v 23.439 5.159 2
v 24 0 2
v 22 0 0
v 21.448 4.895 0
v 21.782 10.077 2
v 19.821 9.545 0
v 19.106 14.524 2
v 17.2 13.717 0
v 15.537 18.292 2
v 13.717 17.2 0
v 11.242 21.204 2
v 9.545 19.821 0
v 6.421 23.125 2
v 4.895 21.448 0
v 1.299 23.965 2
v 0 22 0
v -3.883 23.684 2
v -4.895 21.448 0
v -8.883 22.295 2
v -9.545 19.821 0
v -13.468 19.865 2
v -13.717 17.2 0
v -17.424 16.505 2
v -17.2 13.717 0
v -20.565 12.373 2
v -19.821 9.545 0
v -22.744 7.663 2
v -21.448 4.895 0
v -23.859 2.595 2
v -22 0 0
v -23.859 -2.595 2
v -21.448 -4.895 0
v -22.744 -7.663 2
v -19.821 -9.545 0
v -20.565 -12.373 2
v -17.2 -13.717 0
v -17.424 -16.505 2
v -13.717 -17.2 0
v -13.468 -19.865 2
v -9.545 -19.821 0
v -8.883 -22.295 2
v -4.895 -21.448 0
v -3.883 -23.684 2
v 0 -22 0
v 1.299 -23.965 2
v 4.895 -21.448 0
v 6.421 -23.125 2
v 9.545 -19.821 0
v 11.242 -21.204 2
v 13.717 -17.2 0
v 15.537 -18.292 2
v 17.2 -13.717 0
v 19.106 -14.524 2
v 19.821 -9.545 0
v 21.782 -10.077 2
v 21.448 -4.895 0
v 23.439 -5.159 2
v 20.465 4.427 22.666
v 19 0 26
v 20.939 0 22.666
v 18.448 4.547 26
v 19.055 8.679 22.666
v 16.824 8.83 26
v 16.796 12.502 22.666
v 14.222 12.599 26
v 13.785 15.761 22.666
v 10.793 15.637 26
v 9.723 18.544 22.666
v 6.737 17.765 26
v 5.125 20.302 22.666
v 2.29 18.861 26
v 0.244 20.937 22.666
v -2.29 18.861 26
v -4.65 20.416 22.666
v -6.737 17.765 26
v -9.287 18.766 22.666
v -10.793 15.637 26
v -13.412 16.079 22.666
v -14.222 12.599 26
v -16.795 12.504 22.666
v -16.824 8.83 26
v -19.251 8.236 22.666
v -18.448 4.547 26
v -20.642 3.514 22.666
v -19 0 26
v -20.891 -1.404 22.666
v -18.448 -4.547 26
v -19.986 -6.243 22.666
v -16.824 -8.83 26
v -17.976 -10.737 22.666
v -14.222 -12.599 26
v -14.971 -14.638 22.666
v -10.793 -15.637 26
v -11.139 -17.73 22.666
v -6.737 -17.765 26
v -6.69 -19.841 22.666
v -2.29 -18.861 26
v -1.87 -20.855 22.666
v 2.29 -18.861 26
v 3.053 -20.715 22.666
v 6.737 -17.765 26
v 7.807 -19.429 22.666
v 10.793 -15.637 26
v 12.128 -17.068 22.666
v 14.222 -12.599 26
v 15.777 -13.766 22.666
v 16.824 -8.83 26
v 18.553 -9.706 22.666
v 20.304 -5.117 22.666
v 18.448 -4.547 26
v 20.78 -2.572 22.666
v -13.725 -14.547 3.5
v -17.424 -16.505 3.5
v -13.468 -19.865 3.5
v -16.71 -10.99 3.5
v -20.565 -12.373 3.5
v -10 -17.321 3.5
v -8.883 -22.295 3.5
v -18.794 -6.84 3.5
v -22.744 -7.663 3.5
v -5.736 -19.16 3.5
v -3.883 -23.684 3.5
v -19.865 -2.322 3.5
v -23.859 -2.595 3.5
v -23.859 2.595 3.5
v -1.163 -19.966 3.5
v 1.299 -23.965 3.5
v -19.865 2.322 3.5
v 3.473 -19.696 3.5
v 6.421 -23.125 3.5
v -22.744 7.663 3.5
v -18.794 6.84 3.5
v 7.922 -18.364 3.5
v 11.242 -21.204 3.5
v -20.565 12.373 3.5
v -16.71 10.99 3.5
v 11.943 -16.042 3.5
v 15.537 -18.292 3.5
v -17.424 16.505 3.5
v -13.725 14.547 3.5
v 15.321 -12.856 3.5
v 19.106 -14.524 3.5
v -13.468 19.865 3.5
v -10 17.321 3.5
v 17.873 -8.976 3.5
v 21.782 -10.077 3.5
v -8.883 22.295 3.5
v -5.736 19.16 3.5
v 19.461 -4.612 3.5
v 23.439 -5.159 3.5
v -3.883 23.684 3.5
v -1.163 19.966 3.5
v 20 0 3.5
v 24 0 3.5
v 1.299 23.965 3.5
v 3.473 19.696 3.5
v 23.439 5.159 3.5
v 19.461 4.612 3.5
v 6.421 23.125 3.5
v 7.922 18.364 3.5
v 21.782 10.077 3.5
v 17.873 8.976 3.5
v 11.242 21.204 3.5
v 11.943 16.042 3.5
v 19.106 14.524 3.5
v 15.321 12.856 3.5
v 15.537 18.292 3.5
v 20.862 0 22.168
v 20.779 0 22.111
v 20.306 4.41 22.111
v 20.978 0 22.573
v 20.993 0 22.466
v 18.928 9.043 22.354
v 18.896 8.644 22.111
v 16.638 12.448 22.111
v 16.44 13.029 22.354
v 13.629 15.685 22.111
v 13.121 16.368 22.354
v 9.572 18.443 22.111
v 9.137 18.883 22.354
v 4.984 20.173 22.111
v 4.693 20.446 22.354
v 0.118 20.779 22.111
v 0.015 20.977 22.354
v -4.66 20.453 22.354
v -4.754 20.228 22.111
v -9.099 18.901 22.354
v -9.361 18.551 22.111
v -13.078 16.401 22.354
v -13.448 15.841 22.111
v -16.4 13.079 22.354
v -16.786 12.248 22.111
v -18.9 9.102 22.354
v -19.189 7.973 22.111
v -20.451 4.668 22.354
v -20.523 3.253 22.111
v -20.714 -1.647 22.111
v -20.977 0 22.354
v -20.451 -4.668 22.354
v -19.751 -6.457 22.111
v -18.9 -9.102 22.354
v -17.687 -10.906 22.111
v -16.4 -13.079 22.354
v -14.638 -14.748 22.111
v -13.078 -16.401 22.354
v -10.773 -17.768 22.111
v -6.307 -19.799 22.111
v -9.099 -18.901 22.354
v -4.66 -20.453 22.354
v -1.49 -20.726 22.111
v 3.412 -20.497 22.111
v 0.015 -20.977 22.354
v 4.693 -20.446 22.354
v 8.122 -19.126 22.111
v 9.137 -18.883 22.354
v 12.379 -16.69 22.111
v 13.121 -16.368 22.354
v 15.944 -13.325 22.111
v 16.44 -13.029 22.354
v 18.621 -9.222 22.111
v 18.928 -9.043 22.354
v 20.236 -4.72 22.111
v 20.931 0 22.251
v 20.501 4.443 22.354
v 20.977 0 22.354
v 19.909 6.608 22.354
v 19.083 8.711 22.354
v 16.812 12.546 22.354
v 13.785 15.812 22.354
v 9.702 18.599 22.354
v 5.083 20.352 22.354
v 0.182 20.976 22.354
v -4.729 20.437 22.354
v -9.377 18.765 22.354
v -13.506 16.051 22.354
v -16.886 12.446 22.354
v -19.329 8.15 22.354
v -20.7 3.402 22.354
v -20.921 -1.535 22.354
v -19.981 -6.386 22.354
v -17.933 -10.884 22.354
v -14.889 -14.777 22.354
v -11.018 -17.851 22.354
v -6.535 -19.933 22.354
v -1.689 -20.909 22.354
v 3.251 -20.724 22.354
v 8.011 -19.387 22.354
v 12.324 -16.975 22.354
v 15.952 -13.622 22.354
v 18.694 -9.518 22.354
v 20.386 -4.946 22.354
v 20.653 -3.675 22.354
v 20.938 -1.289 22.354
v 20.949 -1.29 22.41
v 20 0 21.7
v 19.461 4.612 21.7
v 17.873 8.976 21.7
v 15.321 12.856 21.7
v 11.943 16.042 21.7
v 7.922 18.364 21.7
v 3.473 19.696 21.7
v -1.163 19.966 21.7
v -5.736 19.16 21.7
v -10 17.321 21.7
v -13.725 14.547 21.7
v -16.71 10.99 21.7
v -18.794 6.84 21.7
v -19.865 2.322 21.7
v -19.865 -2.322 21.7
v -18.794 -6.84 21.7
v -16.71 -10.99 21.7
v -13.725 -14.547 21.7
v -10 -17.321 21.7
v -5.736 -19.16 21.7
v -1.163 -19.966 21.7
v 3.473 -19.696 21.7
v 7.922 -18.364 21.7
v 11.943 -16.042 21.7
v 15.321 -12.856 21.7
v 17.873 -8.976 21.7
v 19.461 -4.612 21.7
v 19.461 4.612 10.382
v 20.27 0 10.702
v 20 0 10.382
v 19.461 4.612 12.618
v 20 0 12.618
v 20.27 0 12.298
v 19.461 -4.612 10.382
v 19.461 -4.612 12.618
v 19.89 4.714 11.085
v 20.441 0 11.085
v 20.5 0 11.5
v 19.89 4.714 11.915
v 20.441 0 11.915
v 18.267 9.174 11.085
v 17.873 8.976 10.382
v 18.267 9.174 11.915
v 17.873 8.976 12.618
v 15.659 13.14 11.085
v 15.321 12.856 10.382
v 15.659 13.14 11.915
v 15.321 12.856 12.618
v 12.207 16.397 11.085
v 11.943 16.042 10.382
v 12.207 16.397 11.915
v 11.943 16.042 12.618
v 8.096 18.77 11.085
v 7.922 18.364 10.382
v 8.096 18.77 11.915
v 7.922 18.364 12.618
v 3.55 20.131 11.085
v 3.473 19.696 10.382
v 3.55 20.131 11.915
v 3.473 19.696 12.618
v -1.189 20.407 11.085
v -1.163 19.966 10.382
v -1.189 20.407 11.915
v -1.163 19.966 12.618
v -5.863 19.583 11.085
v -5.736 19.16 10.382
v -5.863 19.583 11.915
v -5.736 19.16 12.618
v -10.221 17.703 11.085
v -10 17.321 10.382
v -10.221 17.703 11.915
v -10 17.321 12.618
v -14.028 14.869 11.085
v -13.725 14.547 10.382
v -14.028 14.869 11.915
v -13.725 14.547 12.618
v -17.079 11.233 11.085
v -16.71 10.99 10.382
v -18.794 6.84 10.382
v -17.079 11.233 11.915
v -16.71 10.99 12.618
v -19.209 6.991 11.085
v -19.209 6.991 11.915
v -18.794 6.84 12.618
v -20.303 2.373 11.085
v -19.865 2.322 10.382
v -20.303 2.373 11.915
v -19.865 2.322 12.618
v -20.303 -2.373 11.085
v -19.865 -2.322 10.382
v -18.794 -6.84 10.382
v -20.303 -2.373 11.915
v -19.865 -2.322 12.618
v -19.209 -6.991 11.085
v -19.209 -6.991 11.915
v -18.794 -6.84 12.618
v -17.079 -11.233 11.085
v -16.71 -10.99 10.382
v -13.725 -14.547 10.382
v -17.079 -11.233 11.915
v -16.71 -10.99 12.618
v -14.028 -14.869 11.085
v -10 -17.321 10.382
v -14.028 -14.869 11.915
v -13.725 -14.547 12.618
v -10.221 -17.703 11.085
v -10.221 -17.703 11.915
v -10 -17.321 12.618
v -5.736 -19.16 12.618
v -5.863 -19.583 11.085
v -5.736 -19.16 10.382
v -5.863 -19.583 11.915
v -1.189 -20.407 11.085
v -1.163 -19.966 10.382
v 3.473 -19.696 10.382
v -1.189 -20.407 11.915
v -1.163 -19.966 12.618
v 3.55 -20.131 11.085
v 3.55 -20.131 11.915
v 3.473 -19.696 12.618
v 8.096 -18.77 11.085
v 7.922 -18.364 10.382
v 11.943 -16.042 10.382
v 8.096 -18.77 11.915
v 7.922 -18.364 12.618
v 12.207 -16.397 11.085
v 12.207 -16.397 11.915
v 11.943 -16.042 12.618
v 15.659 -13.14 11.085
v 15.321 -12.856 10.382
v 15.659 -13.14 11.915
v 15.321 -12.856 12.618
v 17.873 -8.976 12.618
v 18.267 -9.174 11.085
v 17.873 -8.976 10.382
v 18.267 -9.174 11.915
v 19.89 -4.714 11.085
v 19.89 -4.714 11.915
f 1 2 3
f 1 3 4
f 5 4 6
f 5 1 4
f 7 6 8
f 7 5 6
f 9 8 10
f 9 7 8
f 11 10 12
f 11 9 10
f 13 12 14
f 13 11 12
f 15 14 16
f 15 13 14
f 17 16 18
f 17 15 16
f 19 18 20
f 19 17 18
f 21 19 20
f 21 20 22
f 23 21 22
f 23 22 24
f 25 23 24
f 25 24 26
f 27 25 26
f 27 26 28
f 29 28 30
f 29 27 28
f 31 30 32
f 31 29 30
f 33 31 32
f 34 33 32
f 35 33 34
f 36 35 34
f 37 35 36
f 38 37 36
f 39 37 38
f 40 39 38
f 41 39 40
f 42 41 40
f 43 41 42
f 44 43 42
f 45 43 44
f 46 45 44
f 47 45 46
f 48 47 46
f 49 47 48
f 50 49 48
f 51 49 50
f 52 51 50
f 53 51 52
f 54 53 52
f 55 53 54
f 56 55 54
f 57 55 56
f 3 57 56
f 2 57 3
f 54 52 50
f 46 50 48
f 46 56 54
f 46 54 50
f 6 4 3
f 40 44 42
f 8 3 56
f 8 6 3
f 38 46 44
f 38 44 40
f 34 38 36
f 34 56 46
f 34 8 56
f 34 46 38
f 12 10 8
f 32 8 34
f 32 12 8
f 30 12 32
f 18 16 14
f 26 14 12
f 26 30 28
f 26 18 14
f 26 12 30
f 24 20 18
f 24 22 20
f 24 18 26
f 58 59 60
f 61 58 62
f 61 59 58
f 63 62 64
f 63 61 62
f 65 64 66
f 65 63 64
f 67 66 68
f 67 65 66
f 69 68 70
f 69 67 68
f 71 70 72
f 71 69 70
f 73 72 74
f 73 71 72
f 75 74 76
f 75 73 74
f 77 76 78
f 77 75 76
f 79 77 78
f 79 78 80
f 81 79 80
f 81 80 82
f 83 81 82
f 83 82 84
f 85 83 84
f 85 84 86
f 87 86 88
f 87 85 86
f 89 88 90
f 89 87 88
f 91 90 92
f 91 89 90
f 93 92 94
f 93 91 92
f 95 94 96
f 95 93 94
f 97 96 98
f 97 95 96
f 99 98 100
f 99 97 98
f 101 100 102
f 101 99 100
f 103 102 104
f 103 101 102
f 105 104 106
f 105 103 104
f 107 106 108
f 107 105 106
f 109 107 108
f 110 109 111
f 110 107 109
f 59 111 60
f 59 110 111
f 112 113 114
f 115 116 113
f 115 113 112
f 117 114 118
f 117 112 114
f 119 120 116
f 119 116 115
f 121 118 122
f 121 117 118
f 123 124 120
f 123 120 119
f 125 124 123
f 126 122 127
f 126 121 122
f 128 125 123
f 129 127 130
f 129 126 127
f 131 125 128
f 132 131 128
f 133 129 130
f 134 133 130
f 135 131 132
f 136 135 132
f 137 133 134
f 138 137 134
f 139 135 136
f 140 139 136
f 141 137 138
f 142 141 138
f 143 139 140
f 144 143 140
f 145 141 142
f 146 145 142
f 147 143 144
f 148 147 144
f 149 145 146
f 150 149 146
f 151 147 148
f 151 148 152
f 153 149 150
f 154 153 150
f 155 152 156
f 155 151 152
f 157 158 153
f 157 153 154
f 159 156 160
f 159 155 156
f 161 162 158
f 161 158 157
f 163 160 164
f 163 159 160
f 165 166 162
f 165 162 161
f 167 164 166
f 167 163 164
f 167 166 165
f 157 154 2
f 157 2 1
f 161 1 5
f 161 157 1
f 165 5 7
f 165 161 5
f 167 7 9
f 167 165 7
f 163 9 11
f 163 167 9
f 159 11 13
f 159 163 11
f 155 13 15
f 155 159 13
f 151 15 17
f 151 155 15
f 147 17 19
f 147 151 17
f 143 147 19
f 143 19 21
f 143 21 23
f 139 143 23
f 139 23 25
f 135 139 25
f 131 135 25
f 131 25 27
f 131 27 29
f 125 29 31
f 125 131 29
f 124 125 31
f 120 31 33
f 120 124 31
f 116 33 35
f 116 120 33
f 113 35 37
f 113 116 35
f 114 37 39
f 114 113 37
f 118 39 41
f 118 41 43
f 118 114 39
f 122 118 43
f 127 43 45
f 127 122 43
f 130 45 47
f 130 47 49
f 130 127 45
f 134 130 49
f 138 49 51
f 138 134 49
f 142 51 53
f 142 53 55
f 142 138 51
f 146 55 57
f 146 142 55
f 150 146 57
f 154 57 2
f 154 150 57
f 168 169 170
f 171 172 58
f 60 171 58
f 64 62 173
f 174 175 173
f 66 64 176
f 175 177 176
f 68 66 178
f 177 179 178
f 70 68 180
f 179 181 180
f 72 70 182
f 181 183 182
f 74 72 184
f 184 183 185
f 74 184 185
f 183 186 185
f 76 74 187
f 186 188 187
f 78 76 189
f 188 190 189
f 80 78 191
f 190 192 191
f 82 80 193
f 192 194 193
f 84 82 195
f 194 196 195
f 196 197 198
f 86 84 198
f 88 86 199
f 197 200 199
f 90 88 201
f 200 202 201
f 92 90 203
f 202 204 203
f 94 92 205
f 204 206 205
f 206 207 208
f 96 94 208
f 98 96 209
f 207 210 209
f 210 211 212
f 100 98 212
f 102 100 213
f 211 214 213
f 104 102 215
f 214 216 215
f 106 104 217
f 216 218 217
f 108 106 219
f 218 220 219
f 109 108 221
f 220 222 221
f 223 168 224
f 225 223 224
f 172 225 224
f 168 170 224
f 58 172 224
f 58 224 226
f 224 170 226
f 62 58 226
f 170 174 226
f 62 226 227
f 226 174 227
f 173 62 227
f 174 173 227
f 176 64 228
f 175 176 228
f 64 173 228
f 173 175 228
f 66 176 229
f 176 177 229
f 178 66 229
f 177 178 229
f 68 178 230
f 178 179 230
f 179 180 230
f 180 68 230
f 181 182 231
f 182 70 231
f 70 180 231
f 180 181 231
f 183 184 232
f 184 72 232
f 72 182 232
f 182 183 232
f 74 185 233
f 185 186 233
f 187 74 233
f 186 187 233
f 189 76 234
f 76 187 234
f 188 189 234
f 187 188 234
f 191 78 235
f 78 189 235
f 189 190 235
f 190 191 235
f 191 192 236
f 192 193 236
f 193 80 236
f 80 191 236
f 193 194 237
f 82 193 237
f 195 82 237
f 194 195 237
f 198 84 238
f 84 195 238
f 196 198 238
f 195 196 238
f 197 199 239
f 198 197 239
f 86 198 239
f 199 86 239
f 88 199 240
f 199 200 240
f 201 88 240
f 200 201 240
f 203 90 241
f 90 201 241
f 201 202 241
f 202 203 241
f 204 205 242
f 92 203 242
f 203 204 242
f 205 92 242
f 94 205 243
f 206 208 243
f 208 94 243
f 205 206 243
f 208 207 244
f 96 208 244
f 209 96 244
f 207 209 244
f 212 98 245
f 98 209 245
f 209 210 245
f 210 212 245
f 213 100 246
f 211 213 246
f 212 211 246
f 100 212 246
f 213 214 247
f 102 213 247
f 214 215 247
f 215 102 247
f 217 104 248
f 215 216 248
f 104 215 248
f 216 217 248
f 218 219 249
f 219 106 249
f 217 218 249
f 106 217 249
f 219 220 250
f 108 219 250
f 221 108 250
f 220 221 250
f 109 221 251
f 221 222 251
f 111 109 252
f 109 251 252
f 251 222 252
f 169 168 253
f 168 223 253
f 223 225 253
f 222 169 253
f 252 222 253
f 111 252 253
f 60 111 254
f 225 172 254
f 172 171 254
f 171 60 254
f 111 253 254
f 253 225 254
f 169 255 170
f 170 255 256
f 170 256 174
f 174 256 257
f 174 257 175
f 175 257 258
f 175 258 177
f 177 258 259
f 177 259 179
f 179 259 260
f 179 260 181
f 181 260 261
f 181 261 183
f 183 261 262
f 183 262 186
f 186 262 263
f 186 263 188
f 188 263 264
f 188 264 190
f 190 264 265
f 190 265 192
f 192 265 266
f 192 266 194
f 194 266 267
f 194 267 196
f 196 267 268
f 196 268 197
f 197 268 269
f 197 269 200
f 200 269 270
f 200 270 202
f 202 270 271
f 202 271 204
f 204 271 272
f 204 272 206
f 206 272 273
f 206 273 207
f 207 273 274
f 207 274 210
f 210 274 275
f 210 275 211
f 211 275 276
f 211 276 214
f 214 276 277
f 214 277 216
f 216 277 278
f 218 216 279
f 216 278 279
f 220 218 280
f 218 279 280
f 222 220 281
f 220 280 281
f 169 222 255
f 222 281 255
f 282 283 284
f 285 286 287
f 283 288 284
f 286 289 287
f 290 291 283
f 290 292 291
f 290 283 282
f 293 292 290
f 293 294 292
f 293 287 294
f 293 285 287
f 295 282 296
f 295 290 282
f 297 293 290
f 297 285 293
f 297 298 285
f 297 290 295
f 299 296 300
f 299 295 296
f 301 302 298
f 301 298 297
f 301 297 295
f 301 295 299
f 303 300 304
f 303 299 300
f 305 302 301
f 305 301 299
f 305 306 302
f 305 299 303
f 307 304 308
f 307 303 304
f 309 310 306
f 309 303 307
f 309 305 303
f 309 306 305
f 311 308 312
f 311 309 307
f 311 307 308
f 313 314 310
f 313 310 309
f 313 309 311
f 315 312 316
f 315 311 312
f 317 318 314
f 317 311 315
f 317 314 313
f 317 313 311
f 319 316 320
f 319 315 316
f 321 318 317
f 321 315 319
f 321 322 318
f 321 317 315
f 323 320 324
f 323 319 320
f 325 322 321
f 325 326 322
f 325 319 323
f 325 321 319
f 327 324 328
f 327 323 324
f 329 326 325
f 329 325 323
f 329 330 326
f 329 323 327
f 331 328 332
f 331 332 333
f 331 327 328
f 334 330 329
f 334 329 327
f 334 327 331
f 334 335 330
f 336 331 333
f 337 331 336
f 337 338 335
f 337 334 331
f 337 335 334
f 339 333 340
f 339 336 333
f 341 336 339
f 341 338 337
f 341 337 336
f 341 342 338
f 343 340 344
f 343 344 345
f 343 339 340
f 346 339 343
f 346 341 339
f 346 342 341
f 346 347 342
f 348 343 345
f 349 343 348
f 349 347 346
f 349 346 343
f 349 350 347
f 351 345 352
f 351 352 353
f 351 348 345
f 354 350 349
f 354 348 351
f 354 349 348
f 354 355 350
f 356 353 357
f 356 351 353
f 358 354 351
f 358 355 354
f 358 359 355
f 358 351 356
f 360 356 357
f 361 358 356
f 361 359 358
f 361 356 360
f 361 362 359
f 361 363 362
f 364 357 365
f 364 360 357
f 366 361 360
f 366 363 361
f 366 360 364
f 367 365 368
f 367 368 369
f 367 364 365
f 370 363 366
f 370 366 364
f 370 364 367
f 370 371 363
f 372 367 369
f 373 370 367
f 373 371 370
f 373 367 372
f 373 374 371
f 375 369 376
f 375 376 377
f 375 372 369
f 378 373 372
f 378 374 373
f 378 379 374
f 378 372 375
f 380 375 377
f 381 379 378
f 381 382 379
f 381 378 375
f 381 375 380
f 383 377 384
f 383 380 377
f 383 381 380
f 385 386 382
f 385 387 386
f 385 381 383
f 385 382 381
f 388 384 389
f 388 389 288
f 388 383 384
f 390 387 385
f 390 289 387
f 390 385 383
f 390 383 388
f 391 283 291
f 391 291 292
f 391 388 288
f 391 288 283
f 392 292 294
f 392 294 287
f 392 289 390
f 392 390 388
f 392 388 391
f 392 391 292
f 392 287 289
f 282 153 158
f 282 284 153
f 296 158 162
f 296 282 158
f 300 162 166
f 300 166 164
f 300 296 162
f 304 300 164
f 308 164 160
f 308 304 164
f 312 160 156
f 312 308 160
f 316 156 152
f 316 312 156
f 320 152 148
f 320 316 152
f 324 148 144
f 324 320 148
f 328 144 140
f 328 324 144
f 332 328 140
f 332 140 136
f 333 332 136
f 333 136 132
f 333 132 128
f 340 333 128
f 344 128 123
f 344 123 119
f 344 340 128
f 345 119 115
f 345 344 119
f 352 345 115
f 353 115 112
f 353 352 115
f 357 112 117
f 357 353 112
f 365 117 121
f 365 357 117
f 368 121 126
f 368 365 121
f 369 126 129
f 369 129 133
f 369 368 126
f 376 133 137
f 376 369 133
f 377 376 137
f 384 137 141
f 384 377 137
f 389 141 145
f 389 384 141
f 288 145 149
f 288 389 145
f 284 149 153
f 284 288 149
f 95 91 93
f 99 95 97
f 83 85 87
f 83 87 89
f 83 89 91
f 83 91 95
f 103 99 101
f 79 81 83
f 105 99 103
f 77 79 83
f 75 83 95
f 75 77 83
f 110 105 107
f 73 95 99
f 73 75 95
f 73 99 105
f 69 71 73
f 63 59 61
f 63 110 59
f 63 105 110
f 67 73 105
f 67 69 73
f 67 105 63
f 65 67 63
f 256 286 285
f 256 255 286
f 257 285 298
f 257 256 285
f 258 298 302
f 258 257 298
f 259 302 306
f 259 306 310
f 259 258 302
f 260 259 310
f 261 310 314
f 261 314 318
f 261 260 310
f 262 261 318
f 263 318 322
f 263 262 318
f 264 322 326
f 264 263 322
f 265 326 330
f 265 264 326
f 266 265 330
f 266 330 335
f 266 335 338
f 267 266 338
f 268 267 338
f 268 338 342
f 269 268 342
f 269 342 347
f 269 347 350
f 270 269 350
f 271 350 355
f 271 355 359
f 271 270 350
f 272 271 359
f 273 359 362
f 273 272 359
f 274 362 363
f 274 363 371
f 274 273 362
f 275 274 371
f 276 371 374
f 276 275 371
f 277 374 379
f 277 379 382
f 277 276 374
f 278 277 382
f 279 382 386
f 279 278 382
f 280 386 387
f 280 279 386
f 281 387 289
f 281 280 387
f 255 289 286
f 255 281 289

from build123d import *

# Parameters (mm, degrees)
F2_SIZE  = 2
F3_SIZE2 = 1.49999
F3_SIZE  = 0.69999
F4_R     = 0.4


# Not quite as in the source:
# - a fillet or chamfer is up to 0.001 mm smaller than in the source, because OpenCascade refuses the exact size


with BuildPart() as f1:
    # F0 (on Front) → F1 (revolve)
    with BuildSketch(Plane.XZ):
        with BuildLine():
            Line((0, 26), (0, 0))
            Line((0, 0), (24, 0))
            Line((24, 0), (24, 3.5))
            Line((24, 3.5), (20, 3.5))
            Line((20, 3.5), (20, 10.3819660113))
            ThreePointArc((20, 10.3819660113), (20.5, 11.5), (20, 12.6180339887))
            Line((20, 12.6180339887), (20, 21.7))
            Line((20, 21.7), (21.5, 21.7))
            Line((21.5, 21.7), (19, 26))
            Line((19, 26), (0, 26))
        make_face()
    revolve(axis=Axis((0, 0, 13), (0, 0, 1)))

    # F2
    f2_edges = [f1.edges().sort_by_distance(p)[0] for p in [
        (-24, 0, 0),
    ]]
    chamfer(f2_edges, length=F2_SIZE)

    # F3 (size 0.7 and 1.5 in the source; OpenCascade refuses exactly that, so slightly less here)
    f3_edges = [f1.edges().sort_by_distance(p)[0] for p in [
        (-21.5, 0, 21.7),
    ]]
    f3_side = f1.faces().sort_by_distance((-20.25, 0, 23.85))[0]
    chamfer(f3_edges, length=F3_SIZE, length2=F3_SIZE2, reference=f3_side)

    # F4
    f4_edges = [f1.edges().sort_by_distance(p)[0] for p in [
        (-21.148171, 0, 22.305146),
    ]]
    fillet(f4_edges, radius=F4_R)


solid = f1.part
